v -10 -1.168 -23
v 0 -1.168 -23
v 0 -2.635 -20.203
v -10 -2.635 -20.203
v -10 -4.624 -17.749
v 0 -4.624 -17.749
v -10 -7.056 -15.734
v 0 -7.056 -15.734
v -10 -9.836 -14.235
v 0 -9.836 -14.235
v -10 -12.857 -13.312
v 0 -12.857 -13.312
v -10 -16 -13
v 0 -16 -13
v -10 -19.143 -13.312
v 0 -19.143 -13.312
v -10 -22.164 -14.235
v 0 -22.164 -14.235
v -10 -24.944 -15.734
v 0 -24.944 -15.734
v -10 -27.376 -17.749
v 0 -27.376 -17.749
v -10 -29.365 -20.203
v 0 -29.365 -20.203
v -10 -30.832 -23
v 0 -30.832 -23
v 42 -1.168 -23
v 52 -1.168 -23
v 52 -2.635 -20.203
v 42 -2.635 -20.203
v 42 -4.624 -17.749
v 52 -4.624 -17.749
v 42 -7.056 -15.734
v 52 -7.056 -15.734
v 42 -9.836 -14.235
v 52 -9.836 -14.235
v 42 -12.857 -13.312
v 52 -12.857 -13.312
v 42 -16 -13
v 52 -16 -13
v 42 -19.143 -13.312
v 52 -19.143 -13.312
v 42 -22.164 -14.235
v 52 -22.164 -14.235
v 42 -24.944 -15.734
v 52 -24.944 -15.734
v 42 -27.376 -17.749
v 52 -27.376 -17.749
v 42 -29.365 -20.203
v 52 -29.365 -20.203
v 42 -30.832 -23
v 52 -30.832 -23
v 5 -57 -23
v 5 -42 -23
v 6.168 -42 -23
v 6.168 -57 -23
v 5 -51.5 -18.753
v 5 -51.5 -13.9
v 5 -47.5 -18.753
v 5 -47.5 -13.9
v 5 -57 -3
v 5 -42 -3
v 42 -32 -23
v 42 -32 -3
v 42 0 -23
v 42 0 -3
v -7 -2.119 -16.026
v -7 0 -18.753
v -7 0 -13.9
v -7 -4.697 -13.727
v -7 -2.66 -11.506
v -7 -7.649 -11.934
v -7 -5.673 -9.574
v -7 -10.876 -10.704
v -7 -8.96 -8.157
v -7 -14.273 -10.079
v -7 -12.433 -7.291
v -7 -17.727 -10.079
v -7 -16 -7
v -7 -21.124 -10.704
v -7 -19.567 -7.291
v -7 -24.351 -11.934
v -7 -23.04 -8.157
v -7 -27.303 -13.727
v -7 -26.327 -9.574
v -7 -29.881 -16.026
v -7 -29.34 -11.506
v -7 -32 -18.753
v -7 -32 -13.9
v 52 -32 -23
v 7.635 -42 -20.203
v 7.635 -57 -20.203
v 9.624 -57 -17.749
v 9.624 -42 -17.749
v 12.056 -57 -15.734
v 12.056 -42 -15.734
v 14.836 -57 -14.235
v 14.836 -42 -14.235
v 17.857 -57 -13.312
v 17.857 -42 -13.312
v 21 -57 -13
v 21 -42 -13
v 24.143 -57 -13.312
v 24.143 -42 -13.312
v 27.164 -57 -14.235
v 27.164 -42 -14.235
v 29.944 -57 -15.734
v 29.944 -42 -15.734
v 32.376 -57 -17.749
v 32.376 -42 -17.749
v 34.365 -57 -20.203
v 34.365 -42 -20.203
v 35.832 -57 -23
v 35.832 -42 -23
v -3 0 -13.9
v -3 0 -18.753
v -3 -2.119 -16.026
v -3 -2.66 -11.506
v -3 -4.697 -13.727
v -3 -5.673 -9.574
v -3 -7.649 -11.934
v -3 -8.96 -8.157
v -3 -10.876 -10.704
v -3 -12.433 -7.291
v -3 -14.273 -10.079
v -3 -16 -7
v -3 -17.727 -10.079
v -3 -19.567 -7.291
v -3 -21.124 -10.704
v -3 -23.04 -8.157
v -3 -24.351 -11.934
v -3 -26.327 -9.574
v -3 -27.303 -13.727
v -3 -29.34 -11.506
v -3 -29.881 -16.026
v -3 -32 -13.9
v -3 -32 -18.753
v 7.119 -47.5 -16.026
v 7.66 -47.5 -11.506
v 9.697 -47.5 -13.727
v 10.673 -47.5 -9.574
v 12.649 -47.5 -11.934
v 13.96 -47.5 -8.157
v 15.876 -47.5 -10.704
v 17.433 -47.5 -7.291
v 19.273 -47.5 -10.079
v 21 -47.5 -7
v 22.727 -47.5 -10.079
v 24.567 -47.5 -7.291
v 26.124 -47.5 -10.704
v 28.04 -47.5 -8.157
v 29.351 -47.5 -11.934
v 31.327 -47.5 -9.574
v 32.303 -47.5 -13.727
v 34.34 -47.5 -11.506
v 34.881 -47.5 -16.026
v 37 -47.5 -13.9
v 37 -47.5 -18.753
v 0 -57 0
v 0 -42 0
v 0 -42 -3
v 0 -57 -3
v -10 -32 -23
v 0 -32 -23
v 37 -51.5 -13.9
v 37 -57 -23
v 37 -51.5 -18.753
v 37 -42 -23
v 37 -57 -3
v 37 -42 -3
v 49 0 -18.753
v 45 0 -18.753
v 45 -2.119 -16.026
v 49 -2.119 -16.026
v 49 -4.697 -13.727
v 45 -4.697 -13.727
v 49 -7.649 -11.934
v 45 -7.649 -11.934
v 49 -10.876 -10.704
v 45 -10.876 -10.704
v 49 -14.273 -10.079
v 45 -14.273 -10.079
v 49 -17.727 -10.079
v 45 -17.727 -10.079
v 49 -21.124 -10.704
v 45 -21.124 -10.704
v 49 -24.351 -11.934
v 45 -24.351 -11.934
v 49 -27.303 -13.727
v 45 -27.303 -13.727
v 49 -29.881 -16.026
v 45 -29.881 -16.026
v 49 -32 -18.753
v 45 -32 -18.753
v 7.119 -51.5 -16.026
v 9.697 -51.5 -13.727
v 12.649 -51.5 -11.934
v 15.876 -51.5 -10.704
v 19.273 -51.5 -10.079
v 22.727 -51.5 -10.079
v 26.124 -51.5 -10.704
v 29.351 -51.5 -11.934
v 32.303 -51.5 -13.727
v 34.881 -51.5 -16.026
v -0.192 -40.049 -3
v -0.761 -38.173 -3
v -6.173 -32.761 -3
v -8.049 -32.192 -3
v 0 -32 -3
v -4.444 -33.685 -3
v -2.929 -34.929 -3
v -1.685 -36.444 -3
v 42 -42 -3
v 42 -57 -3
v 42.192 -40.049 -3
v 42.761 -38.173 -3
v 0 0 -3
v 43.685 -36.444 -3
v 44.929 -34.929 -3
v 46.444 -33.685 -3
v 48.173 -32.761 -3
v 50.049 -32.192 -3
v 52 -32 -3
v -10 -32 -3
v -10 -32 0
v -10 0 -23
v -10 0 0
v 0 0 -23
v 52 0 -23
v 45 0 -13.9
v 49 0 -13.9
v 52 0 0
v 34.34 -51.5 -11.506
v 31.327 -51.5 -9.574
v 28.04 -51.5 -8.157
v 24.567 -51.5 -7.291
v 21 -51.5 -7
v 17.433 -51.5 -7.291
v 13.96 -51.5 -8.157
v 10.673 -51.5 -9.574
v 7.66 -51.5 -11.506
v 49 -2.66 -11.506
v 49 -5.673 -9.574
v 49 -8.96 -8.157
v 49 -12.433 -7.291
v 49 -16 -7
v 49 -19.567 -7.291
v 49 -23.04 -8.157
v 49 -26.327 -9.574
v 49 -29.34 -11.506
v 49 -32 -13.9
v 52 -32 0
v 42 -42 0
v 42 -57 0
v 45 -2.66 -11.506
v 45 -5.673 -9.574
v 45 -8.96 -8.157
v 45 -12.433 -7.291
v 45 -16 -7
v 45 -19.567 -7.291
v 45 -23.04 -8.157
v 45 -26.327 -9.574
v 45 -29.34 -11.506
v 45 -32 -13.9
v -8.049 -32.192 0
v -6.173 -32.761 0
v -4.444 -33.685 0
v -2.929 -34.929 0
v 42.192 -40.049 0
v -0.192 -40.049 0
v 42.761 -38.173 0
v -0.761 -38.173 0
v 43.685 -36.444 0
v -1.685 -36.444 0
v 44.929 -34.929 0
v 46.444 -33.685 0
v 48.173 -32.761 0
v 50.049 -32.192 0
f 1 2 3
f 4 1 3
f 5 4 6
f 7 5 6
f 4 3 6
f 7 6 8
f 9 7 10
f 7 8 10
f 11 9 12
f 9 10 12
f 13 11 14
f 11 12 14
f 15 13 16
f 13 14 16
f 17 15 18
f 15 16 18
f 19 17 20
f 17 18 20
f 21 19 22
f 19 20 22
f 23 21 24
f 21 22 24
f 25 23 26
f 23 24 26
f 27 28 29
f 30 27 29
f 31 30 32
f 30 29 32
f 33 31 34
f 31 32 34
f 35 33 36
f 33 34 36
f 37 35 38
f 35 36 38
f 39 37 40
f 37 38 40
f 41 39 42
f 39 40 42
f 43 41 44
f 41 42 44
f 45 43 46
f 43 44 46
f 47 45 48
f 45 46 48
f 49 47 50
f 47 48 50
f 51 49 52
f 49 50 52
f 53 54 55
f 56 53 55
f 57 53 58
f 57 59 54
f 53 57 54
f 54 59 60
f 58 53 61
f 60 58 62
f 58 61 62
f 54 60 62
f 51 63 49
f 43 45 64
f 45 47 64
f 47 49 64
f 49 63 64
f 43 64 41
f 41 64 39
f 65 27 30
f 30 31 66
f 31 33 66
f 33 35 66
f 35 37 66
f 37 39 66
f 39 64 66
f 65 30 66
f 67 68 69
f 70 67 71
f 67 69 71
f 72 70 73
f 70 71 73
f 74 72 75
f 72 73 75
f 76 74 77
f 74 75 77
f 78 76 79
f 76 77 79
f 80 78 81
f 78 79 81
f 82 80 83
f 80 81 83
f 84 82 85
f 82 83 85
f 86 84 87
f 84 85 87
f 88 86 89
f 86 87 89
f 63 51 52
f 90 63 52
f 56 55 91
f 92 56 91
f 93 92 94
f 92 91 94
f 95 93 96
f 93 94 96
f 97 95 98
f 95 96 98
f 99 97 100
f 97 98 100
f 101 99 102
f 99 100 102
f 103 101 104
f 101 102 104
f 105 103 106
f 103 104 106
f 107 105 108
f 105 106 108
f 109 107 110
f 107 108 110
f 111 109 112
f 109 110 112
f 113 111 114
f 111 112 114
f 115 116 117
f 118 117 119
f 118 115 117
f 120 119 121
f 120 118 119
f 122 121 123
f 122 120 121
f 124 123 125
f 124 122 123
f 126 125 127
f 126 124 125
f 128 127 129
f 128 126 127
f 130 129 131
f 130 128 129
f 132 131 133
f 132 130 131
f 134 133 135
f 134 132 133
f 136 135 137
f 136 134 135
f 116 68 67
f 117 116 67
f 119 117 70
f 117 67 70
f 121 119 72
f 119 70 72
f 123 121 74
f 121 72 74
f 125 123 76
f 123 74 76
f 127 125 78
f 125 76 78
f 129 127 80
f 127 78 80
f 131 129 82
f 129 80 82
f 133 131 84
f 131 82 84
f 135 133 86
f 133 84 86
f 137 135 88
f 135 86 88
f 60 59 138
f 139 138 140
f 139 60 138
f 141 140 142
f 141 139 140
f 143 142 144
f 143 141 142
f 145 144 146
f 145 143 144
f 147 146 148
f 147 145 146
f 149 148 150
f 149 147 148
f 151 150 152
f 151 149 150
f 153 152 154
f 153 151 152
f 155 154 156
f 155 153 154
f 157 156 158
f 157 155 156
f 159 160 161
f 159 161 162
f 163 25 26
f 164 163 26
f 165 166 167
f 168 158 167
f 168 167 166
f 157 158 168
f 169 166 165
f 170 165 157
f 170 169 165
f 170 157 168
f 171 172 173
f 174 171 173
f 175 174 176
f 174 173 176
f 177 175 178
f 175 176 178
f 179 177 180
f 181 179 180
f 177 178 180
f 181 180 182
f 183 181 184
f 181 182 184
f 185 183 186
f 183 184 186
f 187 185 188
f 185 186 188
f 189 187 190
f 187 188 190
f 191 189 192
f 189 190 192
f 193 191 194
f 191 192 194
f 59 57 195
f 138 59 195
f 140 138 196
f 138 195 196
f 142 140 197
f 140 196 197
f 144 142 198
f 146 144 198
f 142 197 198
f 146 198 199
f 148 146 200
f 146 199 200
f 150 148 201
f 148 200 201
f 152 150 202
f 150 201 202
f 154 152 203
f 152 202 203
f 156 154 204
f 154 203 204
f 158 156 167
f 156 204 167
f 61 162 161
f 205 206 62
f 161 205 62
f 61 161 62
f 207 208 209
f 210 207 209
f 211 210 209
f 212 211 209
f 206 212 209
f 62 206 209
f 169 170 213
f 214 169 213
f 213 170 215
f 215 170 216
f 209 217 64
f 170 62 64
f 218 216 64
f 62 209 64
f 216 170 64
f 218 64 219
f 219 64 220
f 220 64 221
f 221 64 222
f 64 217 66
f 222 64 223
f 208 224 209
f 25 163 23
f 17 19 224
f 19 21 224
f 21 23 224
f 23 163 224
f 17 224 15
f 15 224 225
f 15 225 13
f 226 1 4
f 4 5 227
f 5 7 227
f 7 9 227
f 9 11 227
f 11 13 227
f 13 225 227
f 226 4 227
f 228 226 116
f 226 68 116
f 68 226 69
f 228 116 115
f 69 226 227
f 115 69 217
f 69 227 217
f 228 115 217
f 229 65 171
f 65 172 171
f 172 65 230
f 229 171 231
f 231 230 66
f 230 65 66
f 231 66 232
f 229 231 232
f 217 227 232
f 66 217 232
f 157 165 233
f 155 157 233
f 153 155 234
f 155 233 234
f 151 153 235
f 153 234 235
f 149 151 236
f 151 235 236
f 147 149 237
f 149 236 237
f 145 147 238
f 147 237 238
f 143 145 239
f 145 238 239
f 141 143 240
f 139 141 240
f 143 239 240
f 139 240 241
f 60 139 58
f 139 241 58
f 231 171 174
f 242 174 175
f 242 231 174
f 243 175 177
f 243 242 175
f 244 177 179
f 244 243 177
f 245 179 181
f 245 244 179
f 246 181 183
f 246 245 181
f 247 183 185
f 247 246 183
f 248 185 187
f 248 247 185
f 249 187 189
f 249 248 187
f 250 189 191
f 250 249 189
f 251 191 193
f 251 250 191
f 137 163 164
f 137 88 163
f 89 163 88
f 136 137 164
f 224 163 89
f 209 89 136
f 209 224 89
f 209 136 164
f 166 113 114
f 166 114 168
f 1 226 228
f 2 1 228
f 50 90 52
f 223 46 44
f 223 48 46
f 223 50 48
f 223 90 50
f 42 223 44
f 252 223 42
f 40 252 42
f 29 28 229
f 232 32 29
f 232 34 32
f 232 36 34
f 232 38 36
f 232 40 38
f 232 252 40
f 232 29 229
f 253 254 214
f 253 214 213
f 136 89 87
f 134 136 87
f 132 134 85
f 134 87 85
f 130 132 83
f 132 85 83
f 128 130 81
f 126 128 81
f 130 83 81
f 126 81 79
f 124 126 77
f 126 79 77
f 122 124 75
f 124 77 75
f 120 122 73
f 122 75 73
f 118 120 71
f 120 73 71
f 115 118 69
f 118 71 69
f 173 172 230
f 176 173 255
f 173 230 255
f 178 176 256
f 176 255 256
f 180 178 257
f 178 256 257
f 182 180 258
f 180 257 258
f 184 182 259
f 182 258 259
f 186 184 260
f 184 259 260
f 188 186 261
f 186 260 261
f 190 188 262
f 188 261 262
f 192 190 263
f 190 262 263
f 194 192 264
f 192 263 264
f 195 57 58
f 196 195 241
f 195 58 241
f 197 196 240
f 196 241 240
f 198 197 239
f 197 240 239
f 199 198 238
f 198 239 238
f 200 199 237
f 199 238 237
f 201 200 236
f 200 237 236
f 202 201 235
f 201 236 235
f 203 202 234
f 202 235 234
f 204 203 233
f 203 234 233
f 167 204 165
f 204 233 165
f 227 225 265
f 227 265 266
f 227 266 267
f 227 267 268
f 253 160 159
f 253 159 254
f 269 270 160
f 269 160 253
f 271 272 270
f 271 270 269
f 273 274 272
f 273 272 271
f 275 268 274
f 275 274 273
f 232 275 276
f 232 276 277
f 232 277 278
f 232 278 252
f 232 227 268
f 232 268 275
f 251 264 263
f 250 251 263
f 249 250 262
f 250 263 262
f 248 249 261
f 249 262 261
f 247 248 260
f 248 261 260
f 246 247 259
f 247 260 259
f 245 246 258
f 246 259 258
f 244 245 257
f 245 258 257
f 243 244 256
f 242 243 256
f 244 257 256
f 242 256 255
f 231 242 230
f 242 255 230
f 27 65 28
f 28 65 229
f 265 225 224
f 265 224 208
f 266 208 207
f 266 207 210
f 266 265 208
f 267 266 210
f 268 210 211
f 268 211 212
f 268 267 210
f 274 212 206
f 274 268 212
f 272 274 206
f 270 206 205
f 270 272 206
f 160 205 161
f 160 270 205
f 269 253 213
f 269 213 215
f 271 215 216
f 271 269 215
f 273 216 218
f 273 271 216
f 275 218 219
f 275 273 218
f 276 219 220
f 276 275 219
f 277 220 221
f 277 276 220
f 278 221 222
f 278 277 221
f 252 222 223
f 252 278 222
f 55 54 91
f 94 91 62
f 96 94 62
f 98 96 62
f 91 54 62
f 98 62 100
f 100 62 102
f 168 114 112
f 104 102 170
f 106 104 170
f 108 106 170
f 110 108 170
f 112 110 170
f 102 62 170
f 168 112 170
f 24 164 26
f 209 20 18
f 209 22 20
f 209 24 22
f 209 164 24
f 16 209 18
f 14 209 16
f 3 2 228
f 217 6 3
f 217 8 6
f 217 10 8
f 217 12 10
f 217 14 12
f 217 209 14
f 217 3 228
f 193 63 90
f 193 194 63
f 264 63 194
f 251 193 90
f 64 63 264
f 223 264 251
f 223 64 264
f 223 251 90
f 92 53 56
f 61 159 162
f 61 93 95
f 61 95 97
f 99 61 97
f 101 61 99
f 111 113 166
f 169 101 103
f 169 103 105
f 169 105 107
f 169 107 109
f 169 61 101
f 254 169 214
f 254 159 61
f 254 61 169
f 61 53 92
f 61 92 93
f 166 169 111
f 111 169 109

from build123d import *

# Parameters (mm, degrees)
F1_DEPTH  = 3
F0_W      = 10
F0_H      = 32
F2_DEPTH  = 13
F3_DEPTH  = 10
F4_R      = 16
F5_DEPTH  = 62.001
F6_W      = 32
F6_H      = 15
F7_DEPTH  = 23
F8_R      = 16
F9_DEPTH  = 15.001
F11_START = -3
F11_DEPTH = 4
F12_START = -55
F12_DEPTH = 4
F14_START = -5.5
F14_DEPTH = 4
F15_DEPTH = 3


with BuildPart() as f1:
    # F0 (on Top) → F1 (new body)
    with BuildSketch(Plane.XY):
        Polygon((42, 0), (0, 0), (0, -32), (0, -42), (0, -57), (42, -57), (42, -42), (42, -32), align=None)
    extrude(amount=-F1_DEPTH)

    # F0 (on Top) → F2 (join)
    with BuildSketch(Plane.XY):
        with Locations((47, -16)):
            Rectangle(F0_W, F0_H)
        with Locations((-5, -16)):
            Rectangle(F0_W, F0_H)
    extrude(amount=-F2_DEPTH)

    # F3 (add): faces of the model
    f3_faces = [f1.faces().sort_by_distance(p)[0] for p in [
        (47, -16, -13),
        (-5, -16, -13),
    ]]
    extrude(f3_faces, amount=F3_DEPTH)

    # F4 (on face) → F5 (cut, through all)
    with BuildSketch(Plane.YZ.offset(52)):
        with Locations((-16, -29)):
            Circle(F4_R)
    extrude(amount=-F5_DEPTH, mode=Mode.SUBTRACT)

    # F6 (on face) → F7 (join)
    with BuildSketch(Plane.XY):
        with Locations((21, -49.5)):
            Rectangle(F6_W, F6_H)
    extrude(amount=-F7_DEPTH)

    # F8 (on face) → F9 (cut, through all)
    with BuildSketch(Plane(origin=(0, -42, 0), x_dir=(-1, 0, 0), z_dir=(0, 1, 0))):
        with Locations((-21, -29)):
            Circle(F8_R)
    extrude(amount=-F9_DEPTH, mode=Mode.SUBTRACT)

    # F10 (on face) → F11 (cut)
    with BuildSketch(Plane(origin=(-10, 0, 0), x_dir=(0, -1, 0), z_dir=(-1, 0, 0)).offset(F11_START)):
        with BuildLine():
            ThreePointArc((0, -18.753049234), (16, -10), (32, -18.753049234))
            Line((32, -18.753049234), (32, -13.9003311295))
            ThreePointArc((32, -13.9003311295), (16, -7), (0, -13.9003311295))
            Line((0, -13.9003311295), (0, -18.753049234))
        make_face()
    extrude(amount=-F11_DEPTH, mode=Mode.SUBTRACT)

    # F10 (on face) → F12 (cut)
    with BuildSketch(Plane(origin=(-10, 0, 0), x_dir=(0, -1, 0), z_dir=(-1, 0, 0)).offset(F12_START)):
        with BuildLine():
            ThreePointArc((0, -18.753049234), (16, -10), (32, -18.753049234))
            Line((32, -18.753049234), (32, -13.9003311295))
            ThreePointArc((32, -13.9003311295), (16, -7), (0, -13.9003311295))
            Line((0, -13.9003311295), (0, -18.753049234))
        make_face()
    extrude(amount=-F12_DEPTH, mode=Mode.SUBTRACT)

    # F13 (on face) → F14 (cut)
    with BuildSketch(Plane.XZ.offset(57).offset(F14_START)):
        with BuildLine():
            ThreePointArc((5, -18.753049234), (21, -10), (37, -18.753049234))
            Line((37, -18.753049234), (37, -13.9003311295))
            ThreePointArc((37, -13.9003311295), (21, -7), (5, -13.9003311295))
            Line((5, -13.9003311295), (5, -18.753049234))
        make_face()
    extrude(amount=-F14_DEPTH, mode=Mode.SUBTRACT)

    # F0 (on Top) → F15 (join)
    with BuildSketch(Plane.XY):
        with BuildLine():
            Line((52, -32), (42, -32))
            Line((42, -32), (42, -42))
            ThreePointArc((42, -42), (44.9289321881, -34.9289321881), (52, -32))
        make_face()
        with BuildLine():
            Line((0, -42), (0, -32))
            Line((0, -32), (-10, -32))
            ThreePointArc((-10, -32), (-2.9289321881, -34.9289321881), (0, -42))
        make_face()
    extrude(amount=-F15_DEPTH)


solid = f1.part
